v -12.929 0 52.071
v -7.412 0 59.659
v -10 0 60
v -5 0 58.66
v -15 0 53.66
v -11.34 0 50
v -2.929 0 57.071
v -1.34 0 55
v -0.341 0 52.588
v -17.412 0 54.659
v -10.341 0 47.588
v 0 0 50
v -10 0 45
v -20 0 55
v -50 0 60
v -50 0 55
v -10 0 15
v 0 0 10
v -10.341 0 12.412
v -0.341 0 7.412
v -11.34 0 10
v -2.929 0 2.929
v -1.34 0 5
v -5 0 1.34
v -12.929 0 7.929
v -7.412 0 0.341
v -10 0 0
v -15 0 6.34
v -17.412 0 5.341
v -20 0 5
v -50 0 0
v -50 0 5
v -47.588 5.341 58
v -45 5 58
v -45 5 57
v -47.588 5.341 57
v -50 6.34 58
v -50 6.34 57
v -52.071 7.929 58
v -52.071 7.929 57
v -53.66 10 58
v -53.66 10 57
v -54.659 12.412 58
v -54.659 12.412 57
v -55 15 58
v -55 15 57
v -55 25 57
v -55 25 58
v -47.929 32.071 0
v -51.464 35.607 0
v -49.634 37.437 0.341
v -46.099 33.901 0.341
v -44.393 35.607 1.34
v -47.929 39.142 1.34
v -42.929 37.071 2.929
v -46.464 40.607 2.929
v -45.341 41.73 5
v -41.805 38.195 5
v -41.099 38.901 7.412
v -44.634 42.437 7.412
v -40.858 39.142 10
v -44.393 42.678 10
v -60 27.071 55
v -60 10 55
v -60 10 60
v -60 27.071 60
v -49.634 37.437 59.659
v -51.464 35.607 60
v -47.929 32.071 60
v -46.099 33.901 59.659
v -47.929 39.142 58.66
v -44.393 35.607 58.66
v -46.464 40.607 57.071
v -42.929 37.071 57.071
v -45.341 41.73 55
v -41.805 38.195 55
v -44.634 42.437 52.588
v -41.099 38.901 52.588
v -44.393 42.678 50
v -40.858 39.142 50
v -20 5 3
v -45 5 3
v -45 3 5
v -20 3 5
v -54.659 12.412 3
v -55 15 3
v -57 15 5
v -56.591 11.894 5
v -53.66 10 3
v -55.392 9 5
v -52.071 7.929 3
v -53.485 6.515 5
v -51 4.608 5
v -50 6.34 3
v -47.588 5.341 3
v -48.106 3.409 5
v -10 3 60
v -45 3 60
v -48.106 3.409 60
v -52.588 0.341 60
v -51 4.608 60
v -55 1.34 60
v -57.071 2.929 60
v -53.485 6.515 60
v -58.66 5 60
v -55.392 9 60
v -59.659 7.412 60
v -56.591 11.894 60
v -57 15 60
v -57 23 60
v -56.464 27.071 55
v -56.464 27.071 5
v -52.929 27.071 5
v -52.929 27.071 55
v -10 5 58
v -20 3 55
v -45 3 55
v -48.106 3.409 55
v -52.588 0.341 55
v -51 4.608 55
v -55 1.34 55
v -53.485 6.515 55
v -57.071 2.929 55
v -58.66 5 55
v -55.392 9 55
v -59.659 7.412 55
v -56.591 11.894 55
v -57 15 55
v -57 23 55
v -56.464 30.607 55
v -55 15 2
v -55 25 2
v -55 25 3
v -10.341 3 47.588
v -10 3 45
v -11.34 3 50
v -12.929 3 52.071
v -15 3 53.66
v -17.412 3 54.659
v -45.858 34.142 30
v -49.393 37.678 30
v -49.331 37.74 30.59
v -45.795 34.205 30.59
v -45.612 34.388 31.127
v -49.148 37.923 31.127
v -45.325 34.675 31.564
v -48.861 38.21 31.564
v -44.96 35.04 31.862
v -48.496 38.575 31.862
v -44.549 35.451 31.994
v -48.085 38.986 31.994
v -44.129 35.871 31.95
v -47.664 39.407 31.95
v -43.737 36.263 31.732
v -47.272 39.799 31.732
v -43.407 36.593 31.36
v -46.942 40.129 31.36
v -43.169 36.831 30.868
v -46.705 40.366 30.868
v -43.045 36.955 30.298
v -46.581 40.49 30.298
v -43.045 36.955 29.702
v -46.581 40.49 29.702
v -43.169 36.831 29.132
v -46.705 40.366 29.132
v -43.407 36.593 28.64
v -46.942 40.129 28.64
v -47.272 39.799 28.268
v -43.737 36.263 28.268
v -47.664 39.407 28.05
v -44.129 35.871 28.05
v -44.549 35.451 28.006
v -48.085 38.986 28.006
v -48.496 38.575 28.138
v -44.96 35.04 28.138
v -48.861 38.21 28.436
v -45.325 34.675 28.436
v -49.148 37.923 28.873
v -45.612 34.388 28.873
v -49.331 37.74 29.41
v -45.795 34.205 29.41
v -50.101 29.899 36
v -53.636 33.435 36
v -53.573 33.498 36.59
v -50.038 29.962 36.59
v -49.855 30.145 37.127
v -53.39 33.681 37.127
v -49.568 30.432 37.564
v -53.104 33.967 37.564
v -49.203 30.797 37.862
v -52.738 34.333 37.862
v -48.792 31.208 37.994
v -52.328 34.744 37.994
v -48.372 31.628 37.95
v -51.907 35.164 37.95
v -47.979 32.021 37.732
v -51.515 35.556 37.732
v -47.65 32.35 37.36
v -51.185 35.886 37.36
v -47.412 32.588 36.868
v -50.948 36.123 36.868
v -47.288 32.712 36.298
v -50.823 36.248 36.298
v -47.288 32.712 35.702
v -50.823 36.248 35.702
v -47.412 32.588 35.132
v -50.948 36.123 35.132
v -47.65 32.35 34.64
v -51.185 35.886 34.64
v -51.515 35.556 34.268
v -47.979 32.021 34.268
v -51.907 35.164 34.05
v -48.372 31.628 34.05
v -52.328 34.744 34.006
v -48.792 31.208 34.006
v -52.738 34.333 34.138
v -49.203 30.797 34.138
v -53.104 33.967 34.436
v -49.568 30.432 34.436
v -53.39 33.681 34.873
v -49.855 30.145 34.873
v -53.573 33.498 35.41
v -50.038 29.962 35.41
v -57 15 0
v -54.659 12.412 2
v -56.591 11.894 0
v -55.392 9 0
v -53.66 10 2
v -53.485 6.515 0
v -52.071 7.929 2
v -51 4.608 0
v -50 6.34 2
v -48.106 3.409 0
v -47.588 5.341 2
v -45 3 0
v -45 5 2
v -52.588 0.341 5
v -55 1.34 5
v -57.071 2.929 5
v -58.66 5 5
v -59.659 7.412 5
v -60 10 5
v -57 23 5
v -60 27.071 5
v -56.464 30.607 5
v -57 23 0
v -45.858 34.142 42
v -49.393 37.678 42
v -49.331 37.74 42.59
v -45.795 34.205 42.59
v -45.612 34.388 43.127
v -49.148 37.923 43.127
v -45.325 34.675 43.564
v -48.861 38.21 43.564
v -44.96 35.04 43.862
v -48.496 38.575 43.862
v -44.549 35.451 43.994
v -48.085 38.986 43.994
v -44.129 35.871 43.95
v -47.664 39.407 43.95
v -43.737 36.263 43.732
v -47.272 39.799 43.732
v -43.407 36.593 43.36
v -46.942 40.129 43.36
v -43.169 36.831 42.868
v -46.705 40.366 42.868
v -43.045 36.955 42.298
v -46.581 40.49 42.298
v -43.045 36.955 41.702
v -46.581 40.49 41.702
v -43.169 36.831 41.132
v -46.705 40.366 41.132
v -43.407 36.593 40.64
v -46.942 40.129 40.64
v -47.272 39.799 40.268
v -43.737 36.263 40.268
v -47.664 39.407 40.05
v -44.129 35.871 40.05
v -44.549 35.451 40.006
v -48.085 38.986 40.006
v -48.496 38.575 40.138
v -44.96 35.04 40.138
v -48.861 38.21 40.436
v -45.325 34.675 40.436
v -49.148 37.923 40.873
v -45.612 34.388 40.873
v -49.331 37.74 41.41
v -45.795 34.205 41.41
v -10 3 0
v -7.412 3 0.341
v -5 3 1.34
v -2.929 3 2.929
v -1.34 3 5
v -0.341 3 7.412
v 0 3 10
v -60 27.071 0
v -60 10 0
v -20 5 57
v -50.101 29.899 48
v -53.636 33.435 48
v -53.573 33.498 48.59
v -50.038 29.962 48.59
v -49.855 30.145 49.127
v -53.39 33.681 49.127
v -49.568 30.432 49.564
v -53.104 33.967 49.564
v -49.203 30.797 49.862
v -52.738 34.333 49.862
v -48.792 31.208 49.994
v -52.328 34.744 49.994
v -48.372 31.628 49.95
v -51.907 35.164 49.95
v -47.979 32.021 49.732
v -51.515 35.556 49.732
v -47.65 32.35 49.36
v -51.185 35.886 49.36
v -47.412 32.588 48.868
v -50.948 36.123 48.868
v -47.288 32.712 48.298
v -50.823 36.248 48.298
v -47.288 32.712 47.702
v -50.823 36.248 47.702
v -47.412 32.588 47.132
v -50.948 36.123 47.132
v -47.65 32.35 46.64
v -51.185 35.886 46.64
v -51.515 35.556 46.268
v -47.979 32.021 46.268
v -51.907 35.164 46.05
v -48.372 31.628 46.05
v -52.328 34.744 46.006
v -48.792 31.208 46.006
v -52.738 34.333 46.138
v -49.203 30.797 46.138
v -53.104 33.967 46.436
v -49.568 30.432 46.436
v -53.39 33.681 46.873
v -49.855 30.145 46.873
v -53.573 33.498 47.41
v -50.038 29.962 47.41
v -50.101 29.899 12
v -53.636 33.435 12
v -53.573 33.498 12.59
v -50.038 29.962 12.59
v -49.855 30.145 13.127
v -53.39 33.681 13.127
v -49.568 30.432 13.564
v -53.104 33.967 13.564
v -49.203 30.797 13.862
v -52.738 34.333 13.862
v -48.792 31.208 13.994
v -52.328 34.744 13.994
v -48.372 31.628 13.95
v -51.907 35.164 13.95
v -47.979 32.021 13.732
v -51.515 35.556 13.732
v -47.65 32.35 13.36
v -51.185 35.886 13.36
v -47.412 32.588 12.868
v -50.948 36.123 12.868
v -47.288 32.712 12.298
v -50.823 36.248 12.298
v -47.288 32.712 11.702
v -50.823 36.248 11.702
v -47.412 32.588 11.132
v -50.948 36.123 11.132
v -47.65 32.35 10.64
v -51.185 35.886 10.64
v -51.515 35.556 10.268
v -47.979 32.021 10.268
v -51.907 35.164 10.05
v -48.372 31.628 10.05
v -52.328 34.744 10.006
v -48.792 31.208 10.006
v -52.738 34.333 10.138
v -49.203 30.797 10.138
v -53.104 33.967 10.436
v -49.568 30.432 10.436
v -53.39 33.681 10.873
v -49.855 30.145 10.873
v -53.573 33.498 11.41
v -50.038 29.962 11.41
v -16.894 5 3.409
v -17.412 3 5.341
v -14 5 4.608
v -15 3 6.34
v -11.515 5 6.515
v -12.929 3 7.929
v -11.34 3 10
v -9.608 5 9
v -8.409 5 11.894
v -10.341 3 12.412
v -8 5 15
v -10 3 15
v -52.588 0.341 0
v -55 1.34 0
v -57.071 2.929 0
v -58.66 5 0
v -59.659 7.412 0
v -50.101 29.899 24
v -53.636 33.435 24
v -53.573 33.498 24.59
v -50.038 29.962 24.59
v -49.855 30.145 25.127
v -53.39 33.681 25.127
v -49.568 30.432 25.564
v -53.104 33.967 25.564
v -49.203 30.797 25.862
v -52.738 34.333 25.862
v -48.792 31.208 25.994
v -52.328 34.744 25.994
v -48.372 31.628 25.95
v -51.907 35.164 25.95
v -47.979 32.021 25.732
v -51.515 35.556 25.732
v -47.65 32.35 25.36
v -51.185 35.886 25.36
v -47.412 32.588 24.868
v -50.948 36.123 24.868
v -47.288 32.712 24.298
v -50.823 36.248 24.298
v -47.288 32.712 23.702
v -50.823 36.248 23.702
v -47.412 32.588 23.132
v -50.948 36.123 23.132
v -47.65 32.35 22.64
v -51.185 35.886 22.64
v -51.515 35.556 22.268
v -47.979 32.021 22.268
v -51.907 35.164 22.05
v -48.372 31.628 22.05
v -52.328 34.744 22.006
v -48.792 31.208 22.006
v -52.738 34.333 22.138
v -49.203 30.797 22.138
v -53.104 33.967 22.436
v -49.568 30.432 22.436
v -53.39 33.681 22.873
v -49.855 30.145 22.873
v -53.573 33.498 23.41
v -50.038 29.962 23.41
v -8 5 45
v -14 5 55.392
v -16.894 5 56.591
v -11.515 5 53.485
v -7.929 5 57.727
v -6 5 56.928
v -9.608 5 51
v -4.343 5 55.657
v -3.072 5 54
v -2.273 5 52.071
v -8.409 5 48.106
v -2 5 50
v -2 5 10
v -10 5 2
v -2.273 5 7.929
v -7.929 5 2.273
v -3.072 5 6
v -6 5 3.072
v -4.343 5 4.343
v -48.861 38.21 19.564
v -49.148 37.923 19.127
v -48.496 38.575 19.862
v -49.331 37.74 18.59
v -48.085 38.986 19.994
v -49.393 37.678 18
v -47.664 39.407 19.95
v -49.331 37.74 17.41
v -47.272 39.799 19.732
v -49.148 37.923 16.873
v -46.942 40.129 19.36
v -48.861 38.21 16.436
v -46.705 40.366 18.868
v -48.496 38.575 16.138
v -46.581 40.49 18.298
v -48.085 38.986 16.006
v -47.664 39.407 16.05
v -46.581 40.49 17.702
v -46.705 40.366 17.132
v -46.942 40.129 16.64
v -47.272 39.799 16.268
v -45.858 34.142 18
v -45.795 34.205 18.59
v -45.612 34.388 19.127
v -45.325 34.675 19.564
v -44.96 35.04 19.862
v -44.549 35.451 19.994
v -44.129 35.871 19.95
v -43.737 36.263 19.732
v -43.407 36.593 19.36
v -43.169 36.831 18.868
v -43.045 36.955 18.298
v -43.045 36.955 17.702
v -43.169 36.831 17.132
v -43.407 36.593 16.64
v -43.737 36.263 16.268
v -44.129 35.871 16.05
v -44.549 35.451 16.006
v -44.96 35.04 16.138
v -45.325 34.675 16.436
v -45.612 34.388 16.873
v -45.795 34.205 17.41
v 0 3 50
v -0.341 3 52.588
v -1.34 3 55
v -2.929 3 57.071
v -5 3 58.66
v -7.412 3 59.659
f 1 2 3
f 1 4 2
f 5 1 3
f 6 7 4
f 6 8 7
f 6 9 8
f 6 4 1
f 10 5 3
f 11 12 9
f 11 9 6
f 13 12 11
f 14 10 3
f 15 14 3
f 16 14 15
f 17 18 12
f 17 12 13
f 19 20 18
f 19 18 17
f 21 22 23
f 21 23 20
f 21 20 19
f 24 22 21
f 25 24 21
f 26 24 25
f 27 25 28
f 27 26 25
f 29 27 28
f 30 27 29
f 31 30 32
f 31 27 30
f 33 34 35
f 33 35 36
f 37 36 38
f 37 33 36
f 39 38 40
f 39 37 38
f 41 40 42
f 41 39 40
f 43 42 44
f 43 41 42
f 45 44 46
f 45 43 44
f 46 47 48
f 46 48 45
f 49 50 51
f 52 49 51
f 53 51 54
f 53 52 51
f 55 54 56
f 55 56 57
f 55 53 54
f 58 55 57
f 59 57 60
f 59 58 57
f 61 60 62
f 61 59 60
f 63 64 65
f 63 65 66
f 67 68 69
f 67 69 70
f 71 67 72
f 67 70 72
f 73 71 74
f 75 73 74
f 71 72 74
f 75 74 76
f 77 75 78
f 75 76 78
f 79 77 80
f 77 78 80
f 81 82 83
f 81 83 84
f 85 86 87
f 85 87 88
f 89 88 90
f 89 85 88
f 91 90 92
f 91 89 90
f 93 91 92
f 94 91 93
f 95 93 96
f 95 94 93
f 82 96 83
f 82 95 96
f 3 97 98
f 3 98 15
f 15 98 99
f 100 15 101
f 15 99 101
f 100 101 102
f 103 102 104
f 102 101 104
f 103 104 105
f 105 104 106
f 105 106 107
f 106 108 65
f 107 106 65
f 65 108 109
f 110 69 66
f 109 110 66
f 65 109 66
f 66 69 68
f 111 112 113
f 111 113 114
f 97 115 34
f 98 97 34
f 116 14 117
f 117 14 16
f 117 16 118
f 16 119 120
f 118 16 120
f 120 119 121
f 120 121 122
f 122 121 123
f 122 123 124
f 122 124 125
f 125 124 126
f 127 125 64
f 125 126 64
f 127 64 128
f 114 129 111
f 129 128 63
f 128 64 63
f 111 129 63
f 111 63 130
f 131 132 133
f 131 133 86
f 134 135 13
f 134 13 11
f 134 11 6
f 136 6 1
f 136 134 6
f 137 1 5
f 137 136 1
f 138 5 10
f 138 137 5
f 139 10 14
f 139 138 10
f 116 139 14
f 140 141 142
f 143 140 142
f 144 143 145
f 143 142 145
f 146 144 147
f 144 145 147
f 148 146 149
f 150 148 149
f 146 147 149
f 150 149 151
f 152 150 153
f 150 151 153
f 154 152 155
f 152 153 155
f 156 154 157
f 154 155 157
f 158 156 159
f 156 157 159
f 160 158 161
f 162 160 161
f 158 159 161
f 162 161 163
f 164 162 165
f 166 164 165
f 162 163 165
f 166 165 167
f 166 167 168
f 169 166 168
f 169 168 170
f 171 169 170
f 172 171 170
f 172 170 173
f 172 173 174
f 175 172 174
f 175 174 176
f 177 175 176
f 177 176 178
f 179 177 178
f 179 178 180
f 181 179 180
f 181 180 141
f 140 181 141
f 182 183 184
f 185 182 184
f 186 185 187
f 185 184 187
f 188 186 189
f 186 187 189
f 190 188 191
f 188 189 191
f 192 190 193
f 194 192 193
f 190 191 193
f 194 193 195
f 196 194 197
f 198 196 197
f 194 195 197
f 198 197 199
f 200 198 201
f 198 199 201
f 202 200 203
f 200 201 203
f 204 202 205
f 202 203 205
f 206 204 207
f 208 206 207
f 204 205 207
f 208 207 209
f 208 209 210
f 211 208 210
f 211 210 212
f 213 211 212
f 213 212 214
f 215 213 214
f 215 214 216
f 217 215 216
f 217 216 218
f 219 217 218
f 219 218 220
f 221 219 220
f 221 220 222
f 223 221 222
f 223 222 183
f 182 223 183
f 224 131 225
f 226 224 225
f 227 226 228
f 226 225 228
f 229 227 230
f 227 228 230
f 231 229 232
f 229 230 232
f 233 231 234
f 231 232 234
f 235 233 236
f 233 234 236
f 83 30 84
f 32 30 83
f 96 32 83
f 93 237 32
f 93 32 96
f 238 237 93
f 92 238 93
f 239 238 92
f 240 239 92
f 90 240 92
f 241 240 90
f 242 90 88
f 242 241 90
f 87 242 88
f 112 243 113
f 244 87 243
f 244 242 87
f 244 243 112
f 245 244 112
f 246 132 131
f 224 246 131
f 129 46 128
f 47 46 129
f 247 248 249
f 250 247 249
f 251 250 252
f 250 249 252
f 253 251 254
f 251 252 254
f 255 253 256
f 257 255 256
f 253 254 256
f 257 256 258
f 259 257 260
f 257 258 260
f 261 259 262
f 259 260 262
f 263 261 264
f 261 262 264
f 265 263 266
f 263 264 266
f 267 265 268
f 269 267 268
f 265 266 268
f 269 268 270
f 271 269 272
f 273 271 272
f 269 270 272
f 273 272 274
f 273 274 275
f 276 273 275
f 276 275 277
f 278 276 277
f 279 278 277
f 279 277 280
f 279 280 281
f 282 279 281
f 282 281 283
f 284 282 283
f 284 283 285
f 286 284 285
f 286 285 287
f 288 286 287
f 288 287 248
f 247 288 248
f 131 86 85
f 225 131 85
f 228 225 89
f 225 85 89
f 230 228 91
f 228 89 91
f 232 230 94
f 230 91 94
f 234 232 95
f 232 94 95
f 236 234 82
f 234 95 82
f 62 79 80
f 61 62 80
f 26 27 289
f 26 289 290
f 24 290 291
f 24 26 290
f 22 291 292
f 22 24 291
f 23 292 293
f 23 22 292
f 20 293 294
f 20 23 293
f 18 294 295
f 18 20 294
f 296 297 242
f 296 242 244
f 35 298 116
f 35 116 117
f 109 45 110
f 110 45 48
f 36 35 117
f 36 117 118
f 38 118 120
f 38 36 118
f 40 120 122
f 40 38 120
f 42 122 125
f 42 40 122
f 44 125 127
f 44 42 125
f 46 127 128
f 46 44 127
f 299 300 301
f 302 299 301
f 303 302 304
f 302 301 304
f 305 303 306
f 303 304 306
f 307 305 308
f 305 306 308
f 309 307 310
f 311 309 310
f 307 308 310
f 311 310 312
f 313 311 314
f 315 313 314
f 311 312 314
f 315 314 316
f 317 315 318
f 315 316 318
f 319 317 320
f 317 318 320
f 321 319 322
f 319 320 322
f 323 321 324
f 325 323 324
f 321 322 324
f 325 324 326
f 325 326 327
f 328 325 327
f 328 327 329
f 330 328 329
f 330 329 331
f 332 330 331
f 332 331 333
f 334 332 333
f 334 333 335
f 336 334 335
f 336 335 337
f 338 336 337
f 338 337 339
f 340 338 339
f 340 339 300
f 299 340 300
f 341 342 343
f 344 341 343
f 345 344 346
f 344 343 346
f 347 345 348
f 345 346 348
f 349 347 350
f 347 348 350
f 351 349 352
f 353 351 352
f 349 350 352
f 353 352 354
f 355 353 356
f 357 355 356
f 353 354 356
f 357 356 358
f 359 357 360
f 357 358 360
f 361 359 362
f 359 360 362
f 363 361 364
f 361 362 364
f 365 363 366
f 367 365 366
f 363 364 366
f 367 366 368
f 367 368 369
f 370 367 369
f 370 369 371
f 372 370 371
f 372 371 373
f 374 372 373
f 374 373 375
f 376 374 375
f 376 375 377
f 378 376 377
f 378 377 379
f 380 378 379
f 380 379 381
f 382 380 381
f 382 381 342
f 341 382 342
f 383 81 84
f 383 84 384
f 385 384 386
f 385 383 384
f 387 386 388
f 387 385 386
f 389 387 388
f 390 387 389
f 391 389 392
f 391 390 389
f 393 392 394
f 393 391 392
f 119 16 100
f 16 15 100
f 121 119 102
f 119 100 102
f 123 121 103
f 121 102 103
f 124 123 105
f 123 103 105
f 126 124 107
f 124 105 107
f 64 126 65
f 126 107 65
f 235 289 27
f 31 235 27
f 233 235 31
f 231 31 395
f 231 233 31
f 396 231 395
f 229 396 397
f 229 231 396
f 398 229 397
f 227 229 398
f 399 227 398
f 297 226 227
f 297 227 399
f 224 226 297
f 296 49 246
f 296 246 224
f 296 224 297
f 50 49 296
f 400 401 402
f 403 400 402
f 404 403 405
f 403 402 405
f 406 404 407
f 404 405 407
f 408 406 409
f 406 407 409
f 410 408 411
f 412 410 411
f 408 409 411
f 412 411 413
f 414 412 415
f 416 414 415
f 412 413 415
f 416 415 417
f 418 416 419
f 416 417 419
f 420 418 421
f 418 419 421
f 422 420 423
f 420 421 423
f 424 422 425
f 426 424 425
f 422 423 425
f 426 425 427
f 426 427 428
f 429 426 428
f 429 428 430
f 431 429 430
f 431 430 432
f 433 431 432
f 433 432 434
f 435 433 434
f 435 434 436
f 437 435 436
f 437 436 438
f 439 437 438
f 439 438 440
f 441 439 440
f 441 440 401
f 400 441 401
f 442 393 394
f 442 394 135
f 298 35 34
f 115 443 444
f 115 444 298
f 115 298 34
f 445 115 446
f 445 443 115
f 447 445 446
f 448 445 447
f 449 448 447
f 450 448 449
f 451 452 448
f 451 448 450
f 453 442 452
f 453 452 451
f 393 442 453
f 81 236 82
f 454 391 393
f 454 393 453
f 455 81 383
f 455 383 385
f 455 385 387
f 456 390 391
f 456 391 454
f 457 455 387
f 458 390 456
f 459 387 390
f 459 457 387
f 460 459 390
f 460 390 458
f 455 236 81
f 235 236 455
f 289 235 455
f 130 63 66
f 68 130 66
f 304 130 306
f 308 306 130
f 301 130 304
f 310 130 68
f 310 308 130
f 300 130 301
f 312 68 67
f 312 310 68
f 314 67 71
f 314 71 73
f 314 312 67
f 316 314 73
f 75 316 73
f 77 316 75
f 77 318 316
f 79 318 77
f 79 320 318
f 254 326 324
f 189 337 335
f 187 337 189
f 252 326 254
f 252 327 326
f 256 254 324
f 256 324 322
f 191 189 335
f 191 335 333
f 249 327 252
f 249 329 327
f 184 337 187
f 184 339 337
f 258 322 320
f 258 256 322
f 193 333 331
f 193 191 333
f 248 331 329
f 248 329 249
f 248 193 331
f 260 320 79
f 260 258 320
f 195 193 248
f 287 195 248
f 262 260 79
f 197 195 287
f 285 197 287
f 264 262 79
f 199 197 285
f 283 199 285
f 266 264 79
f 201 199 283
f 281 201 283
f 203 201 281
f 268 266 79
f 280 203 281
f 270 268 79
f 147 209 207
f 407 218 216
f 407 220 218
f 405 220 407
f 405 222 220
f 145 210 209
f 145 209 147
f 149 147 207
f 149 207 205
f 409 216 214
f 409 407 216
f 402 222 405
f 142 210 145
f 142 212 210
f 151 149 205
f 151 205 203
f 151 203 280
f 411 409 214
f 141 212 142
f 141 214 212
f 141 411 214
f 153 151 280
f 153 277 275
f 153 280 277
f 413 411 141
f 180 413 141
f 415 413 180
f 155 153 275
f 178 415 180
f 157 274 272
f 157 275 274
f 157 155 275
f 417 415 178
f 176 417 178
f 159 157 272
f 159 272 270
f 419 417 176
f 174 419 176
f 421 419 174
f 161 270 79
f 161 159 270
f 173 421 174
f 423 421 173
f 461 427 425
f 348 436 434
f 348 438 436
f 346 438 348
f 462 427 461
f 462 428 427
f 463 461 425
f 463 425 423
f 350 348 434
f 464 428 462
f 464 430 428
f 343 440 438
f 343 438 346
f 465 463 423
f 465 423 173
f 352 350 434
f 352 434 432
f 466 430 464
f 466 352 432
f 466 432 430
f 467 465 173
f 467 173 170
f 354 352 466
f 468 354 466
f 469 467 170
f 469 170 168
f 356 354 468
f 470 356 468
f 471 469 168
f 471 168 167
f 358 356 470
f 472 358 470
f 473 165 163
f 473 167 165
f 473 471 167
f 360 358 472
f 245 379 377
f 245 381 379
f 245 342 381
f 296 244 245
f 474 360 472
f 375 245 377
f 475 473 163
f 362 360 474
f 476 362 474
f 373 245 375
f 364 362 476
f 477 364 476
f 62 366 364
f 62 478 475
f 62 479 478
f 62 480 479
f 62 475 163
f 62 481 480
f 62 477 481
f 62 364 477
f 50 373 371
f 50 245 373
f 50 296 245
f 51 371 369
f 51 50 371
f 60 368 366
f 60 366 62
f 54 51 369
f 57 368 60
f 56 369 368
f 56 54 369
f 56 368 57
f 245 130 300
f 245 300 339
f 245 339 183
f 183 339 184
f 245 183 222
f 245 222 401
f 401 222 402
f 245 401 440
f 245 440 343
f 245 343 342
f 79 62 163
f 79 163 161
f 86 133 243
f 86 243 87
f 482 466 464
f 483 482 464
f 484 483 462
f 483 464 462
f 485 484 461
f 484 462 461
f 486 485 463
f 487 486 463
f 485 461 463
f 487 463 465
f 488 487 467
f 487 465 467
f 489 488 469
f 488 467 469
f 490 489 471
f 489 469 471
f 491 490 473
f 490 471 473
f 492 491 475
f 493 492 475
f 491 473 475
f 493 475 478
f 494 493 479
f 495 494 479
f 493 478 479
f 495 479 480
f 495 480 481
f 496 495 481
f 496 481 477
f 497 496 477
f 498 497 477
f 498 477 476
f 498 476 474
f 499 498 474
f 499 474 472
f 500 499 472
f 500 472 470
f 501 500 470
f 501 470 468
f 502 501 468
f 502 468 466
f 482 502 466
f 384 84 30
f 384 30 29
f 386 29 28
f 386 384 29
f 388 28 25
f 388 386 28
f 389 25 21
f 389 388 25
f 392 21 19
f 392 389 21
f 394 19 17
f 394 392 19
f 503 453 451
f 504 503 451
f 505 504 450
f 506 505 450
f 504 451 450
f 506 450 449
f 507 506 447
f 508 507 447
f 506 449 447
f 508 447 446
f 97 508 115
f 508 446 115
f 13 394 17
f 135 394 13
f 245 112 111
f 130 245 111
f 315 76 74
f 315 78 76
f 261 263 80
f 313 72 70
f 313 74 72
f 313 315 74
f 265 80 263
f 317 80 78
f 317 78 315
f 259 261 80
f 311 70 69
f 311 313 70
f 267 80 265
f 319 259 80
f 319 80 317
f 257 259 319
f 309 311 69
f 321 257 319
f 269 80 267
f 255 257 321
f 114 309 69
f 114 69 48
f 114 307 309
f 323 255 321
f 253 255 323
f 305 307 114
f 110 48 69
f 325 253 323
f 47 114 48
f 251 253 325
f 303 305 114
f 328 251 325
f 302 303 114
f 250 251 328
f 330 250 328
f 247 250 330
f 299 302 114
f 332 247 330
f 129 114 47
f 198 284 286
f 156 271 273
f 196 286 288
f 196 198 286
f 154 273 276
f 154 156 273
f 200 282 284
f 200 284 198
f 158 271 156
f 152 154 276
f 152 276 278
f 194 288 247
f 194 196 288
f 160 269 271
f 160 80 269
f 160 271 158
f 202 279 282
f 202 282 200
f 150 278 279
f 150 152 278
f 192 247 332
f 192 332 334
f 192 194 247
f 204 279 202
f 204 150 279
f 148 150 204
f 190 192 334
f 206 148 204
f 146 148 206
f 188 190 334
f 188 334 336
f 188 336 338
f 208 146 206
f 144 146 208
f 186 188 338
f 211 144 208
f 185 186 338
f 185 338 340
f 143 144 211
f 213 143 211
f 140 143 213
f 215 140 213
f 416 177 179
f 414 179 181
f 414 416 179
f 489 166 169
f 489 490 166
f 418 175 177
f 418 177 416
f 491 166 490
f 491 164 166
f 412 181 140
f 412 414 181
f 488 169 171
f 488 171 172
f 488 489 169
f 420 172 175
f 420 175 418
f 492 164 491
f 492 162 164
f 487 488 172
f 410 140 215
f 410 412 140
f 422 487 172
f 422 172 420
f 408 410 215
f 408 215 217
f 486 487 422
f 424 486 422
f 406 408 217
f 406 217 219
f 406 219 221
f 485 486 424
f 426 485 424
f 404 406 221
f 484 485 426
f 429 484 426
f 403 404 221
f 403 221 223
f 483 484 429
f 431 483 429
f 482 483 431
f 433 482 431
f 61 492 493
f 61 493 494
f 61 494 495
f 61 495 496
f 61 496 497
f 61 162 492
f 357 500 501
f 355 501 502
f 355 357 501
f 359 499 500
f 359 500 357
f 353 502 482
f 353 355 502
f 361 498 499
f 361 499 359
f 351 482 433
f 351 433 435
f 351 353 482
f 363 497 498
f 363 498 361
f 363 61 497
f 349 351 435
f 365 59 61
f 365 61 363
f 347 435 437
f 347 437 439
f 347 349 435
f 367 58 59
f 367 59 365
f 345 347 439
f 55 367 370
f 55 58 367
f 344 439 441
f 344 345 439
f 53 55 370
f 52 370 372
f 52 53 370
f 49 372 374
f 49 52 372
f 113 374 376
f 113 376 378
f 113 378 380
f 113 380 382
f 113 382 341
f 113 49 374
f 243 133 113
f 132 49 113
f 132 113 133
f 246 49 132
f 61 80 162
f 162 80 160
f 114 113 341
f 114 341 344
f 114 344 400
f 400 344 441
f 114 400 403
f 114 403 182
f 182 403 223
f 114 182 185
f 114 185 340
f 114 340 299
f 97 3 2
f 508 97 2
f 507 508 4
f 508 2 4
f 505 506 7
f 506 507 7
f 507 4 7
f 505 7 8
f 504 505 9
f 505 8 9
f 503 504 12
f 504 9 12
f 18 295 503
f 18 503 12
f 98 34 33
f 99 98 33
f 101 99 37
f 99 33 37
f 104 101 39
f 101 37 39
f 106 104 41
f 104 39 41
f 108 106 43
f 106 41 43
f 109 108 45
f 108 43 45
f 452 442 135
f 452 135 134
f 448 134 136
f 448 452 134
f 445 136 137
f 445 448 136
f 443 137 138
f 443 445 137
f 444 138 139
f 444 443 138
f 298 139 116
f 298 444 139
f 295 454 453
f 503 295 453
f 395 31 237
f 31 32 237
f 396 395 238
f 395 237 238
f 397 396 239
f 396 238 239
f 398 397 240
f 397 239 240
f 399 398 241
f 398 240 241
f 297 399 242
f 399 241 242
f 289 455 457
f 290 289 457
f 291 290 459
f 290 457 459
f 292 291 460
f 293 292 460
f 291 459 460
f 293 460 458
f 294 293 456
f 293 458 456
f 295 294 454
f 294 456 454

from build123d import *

# Parameters (mm, degrees)
BOSS_EXTRUDE1_DEPTH = 60
SKETCH2_W           = 50
SKETCH2_H           = 27.071067812
CUT_EXTRUDE1_DEPTH  = 50
FILLET1_R           = 10
CHAMFER1_SIZE       = 2
SKETCH3_R           = 2
CUT_EXTRUDE2_DEPTH  = 30
CHAMFER2_SIZE       = 5
CHAMFER2_SIZE2      = 3.535533906


with BuildPart() as part:
    # Sketch1 → Boss-Extrude1 (new body)
    with BuildSketch(Plane.XY):
        Polygon((0, 0), (-60, 0), (-60, 27.071067812), (-44.393398282, 42.67766953), (-40.857864376, 39.142135624), (-55, 25), (-55, 5), (0, 5), align=None)
    extrude(amount=BOSS_EXTRUDE1_DEPTH)

    # Sketch2 → Cut-Extrude1 (cut)
    with BuildSketch(Plane.ZY.offset(60)):
        with Locations((30, 13.535533906)):
            Rectangle(SKETCH2_W, SKETCH2_H)
    extrude(amount=-CUT_EXTRUDE1_DEPTH, mode=Mode.SUBTRACT)

    # Fillet1
    fillet1_edges = [part.edges().sort_by_distance(p)[0] for p in [
        (0, 2.5, 60),
        (-55, 5, 57.5),
        (-60, 0, 57.5),
        (-42.625631329, 40.909902577, 60),
        (-55, 5, 2.5),
        (-60, 0, 2.5),
        (-10, 2.5, 5),
        (-10, 2.5, 55),
        (-42.625631329, 40.909902577, 0),
        (0, 2.5, 0),
    ]]
    fillet(fillet1_edges, radius=FILLET1_R)

    # Chamfer1
    chamfer1_edges = [part.edges().sort_by_distance(p)[0] for p in [
        (-55, 20, 5),
        (-10, 5, 30),
        (-32.5, 5, 5),
        (-55, 20, 55),
        (-32.5, 5, 55),
        (-55, 20, 0),
        (-27.5, 5, 0),
        (-27.5, 5, 60),
        (-55, 20, 60),
        (0, 5, 30),
        (-2.928932188, 5, 57.071067812),
        (-2.928932188, 5, 2.928932188),
        (-12.928932188, 5, 7.928932188),
        (-12.928932188, 5, 52.071067812),
        (-52.071067812, 7.928932188, 0),
        (-52.071067812, 7.928932188, 5),
        (-52.071067812, 7.928932188, 55),
        (-52.071067812, 7.928932188, 60),
    ]]
    chamfer(chamfer1_edges, length=CHAMFER1_SIZE)

    # Sketch3 → Cut-Extrude2 (cut)
    with BuildSketch(Plane(origin=(-43.535533906, 43.535533906, 0), x_dir=(0, 0, 1), z_dir=(-0.7071067811865464, 0.7071067811865488, 0))):
        with Locations(Location((30, -6.284271247, 0), (0, 0, 270))):
            Circle(SKETCH3_R)
        with Locations(Location((36, -12.284271247, 0), (0, 0, 270))):
            Circle(SKETCH3_R)
        with Locations(Location((24, -12.284271247, 0), (0, 0, 270))):
            Circle(SKETCH3_R)
        with Locations(Location((18, -6.284271247, 0), (0, 0, 270))):
            Circle(SKETCH3_R)
        with Locations(Location((12, -12.284271247, 0), (0, 0, 270))):
            Circle(SKETCH3_R)
        with Locations(Location((42, -6.284271247, 0), (0, 0, 270))):
            Circle(SKETCH3_R)
        with Locations(Location((48, -12.284271247, 0), (0, 0, 270))):
            Circle(SKETCH3_R)
    extrude(amount=-CUT_EXTRUDE2_DEPTH, mode=Mode.SUBTRACT)

    # Chamfer2
    chamfer2_edges = [part.edges().sort_by_distance(p)[0] for p in [
        (-60, 27.071067812, 30),
    ]]
    chamfer2_side = [part.faces().sort_by_distance(p)[0] for p in [
        (-52.552716381, 34.518351431, 30),
    ]]
    chamfer(chamfer2_edges, length=CHAMFER2_SIZE, length2=CHAMFER2_SIZE2, reference=chamfer2_side[0])


solid = part.part
